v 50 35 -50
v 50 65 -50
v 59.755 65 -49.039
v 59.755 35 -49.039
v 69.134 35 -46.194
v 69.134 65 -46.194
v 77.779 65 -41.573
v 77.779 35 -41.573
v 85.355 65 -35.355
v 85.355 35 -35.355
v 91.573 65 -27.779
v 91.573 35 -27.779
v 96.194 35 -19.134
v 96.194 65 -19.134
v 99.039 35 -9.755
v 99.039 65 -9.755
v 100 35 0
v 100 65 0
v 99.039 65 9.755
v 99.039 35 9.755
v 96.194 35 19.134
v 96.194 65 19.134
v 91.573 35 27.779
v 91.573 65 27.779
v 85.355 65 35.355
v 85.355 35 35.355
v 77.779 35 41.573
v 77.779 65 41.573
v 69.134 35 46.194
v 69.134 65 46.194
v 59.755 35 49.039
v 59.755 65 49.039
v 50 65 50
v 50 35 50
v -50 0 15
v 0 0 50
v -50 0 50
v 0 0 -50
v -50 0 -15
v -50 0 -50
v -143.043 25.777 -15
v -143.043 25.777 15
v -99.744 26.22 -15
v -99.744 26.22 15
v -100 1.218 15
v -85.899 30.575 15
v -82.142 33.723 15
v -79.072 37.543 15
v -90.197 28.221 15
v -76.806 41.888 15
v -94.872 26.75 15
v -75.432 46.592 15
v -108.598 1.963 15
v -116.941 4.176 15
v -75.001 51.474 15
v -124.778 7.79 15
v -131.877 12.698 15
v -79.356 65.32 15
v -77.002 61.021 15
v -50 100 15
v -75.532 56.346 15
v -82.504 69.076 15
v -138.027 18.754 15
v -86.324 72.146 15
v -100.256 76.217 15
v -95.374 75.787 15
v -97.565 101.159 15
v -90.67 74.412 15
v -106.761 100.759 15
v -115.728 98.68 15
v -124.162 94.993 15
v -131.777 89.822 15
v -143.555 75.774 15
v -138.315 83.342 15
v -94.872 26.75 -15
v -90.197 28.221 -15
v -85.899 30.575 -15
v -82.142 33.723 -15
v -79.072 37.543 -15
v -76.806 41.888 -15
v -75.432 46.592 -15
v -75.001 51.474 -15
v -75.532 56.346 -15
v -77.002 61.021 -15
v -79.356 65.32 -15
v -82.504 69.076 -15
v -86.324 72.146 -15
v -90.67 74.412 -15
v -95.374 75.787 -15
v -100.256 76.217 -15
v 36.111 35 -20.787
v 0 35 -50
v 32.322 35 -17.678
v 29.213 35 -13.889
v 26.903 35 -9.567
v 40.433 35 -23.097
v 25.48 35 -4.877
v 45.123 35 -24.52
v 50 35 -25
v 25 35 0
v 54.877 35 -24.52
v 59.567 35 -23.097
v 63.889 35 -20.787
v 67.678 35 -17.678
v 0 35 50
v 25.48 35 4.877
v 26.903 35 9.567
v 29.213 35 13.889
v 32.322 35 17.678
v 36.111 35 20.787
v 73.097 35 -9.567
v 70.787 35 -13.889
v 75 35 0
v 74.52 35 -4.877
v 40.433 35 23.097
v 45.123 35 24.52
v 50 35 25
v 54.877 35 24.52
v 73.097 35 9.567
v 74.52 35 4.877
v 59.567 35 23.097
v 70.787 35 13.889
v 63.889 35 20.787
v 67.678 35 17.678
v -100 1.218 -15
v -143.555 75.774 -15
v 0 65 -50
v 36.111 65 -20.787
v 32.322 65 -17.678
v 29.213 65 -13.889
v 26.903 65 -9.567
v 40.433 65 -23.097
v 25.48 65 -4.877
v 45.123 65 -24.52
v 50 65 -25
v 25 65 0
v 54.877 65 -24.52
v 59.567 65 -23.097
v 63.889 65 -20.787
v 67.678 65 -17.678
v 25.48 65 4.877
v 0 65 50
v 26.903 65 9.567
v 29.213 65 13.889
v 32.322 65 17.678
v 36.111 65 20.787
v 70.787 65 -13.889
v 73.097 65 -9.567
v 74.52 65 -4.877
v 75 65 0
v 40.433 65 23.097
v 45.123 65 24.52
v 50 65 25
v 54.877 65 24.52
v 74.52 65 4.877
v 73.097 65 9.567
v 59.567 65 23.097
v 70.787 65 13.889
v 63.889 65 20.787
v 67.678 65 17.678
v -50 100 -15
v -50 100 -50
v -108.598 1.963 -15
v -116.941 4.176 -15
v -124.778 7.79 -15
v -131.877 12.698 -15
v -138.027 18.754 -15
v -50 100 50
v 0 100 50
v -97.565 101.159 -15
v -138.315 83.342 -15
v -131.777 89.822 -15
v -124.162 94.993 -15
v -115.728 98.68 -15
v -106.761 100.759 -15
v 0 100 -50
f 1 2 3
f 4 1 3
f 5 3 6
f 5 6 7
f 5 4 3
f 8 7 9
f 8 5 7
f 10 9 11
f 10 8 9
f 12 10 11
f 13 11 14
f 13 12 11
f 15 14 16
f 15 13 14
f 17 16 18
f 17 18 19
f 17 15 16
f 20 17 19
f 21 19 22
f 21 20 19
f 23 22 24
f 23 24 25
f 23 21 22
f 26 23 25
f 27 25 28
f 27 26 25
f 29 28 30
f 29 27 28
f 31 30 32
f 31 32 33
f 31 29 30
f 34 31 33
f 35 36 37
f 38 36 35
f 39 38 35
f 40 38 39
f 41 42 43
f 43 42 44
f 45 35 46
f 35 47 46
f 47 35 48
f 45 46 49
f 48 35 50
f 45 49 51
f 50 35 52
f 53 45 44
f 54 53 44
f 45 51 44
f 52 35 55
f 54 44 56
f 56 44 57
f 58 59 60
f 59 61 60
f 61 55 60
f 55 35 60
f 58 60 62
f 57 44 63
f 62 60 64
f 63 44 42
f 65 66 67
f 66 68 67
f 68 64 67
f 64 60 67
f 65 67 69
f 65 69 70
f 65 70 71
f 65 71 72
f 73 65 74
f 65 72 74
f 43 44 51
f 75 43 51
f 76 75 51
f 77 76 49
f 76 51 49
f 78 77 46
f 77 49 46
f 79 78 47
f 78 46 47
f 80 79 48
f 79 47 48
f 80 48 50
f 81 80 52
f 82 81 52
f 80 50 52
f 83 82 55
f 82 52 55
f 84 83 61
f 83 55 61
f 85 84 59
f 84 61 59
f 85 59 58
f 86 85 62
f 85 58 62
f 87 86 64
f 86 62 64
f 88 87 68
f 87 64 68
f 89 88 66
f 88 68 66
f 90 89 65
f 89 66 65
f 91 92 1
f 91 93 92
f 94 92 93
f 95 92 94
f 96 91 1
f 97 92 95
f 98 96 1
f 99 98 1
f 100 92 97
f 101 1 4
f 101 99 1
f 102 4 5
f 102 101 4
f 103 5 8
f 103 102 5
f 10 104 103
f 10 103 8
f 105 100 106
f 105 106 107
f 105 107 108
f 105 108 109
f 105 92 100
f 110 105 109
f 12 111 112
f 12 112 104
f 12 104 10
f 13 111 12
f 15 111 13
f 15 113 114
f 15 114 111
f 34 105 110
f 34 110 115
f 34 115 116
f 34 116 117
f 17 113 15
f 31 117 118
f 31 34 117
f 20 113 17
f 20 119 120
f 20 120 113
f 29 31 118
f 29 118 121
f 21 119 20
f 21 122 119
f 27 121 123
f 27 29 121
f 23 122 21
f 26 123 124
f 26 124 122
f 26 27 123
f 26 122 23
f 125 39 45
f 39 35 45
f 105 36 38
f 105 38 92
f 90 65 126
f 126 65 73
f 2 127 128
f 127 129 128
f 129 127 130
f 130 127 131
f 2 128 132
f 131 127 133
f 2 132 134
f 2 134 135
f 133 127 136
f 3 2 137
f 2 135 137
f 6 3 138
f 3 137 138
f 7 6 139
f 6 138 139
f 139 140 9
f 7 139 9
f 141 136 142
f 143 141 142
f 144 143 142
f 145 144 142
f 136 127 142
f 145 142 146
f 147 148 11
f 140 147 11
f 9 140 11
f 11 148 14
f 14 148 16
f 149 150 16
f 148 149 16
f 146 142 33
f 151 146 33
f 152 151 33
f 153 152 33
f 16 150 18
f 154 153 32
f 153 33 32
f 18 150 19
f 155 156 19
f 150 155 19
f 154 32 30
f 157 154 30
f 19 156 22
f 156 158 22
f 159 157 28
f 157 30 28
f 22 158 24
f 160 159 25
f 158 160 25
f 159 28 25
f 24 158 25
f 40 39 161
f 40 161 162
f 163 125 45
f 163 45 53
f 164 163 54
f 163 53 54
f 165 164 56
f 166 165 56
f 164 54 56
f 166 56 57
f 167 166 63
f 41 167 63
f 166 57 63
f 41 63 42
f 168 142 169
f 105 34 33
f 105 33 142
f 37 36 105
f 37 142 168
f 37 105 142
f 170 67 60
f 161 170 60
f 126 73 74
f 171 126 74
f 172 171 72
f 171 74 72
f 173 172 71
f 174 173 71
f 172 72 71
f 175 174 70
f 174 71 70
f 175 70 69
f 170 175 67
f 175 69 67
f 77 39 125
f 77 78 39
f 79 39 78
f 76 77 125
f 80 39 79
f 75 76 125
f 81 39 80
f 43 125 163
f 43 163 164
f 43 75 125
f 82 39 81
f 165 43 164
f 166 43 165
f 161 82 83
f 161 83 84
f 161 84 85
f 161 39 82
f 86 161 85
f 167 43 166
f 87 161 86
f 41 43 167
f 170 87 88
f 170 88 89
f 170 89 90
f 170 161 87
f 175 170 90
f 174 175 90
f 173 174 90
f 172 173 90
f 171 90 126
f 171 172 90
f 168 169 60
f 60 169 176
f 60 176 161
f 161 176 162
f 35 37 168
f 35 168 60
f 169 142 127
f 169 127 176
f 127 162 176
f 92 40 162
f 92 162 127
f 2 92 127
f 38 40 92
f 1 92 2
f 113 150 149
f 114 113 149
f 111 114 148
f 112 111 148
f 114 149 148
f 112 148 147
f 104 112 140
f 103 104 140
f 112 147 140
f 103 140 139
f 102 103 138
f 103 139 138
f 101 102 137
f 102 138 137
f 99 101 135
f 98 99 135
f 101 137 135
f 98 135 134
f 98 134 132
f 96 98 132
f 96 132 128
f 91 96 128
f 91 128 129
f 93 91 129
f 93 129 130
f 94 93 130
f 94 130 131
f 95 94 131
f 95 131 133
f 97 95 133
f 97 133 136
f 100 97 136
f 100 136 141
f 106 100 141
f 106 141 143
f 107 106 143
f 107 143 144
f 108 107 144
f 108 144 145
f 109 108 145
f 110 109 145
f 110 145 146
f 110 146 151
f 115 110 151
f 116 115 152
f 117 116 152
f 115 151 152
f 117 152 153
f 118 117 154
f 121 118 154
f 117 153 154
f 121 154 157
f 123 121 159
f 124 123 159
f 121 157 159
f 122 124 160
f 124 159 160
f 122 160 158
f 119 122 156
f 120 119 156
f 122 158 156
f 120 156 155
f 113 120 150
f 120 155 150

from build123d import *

# Parameters (mm, degrees)
BOSS_EXTRUDE1_DEPTH = 100
SKETCH4_R           = 25
CUT_EXTRUDE2_DEPTH  = 100
SKETCH6_W           = 100.520267533
SKETCH6_H           = 35
CUT_EXTRUDE4_DEPTH  = 100
BOSS_EXTRUDE3_DEPTH = 15
SKETCH11_R          = 25
CUT_EXTRUDE5_DEPTH  = 30
CUT_EXTRUDE6_DEPTH  = 30


with BuildPart() as part:
    # Sketch2 → Boss-Extrude1 (new body)
    with BuildSketch(Plane(origin=(0, 0, 0), x_dir=(1, 0, 0), z_dir=(0, 1, 0))):
        with BuildLine():
            Line((-50, 50), (50, 50))
            ThreePointArc((50, 50), (100, 0), (50, -50))
            Line((50, -50), (-50, -50))
            Line((-50, -50), (-50, 50))
        make_face()
    extrude(amount=BOSS_EXTRUDE1_DEPTH)

    # Sketch4 → Cut-Extrude2 (cut)
    with BuildSketch(Plane(origin=(0, 100, 0), x_dir=(1, 0, 0), z_dir=(0, 1, 0))):
        with Locations((50, 0)):
            Circle(SKETCH4_R)
    extrude(amount=-CUT_EXTRUDE2_DEPTH, mode=Mode.SUBTRACT)

    # Sketch6 → Cut-Extrude4 (cut)
    with BuildSketch(Plane.XY.offset(50)):
        with Locations((50.260133767, 17.5)):
            Rectangle(SKETCH6_W, SKETCH6_H)
        with Locations((50.260133767, 82.5)):
            Rectangle(SKETCH6_W, SKETCH6_H)
    extrude(amount=-CUT_EXTRUDE4_DEPTH, mode=Mode.SUBTRACT)

    # Sketch10 → Boss-Extrude3 (add, symmetric)
    with BuildSketch(Plane.XY):
        with BuildLine():
            Line((-97.564584058, 101.159083353), (-50, 100))
            Line((-50, 100), (-50, 0))
            Line((-50, 0), (-100, 1.218431082))
            ThreePointArc((-100, 1.218431082), (-149.985160866, 52.436500555), (-97.564584058, 101.159083353))
        make_face()
    extrude(amount=BOSS_EXTRUDE3_DEPTH, both=True)

    # Sketch11 → Cut-Extrude5 (cut)
    with BuildSketch(Plane.XY.offset(15)):
        with Locations((-100, 51.218431082)):
            Circle(SKETCH11_R)
    extrude(amount=-CUT_EXTRUDE5_DEPTH, mode=Mode.SUBTRACT)

    # Sketch12 → Cut-Extrude6 (cut)
    with BuildSketch(Plane.XY.offset(15)):
        Polygon((-218.838630954, 25.001308264), (-99.744243338, 26.219739346), (-100.255756662, 76.217122818), (-219.350144278, 74.998691736), align=None)
    extrude(amount=-CUT_EXTRUDE6_DEPTH, mode=Mode.SUBTRACT)


solid = part.part
